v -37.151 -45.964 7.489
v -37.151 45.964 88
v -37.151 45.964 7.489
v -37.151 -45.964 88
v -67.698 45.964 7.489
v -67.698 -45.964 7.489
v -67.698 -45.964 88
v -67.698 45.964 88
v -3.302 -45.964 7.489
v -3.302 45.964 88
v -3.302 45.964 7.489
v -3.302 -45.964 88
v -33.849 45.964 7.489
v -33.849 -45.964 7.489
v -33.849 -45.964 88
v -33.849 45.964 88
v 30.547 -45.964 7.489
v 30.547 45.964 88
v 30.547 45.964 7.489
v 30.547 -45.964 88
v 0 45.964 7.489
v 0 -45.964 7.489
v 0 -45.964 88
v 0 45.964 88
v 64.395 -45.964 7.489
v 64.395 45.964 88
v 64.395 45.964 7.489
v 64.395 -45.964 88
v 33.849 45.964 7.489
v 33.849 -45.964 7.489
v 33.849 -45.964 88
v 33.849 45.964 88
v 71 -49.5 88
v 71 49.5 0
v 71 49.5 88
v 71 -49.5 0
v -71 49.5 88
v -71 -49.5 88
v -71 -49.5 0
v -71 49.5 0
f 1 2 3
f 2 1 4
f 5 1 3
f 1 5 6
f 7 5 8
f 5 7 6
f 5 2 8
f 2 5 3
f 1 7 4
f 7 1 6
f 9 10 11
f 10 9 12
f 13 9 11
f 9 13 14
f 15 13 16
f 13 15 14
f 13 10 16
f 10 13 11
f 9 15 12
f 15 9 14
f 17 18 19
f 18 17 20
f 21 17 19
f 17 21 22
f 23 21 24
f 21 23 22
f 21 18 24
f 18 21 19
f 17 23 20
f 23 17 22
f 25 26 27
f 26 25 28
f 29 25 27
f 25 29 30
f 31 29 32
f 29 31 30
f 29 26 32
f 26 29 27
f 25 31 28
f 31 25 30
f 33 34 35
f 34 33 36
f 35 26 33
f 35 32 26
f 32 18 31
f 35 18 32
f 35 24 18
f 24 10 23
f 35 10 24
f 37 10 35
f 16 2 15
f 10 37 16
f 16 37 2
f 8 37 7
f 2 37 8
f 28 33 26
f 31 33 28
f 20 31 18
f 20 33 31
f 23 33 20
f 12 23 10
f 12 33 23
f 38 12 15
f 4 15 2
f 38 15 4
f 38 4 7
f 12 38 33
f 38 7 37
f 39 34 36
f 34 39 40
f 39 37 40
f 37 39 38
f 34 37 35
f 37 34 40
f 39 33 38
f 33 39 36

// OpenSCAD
// Studio Tool Bin | 工作室多格工具盒 | original parametric CAD prototype
// CAD uses millimeters/Z-up; target dimensions [width,depth,height] mm.
// Product hypothesis only; full slicer/manifold and real-print checks required.
use <lib/commerce_forms.scad>
resize([142,99,88],auto=false)
    commercial_form(family="organizer",variant=5);
